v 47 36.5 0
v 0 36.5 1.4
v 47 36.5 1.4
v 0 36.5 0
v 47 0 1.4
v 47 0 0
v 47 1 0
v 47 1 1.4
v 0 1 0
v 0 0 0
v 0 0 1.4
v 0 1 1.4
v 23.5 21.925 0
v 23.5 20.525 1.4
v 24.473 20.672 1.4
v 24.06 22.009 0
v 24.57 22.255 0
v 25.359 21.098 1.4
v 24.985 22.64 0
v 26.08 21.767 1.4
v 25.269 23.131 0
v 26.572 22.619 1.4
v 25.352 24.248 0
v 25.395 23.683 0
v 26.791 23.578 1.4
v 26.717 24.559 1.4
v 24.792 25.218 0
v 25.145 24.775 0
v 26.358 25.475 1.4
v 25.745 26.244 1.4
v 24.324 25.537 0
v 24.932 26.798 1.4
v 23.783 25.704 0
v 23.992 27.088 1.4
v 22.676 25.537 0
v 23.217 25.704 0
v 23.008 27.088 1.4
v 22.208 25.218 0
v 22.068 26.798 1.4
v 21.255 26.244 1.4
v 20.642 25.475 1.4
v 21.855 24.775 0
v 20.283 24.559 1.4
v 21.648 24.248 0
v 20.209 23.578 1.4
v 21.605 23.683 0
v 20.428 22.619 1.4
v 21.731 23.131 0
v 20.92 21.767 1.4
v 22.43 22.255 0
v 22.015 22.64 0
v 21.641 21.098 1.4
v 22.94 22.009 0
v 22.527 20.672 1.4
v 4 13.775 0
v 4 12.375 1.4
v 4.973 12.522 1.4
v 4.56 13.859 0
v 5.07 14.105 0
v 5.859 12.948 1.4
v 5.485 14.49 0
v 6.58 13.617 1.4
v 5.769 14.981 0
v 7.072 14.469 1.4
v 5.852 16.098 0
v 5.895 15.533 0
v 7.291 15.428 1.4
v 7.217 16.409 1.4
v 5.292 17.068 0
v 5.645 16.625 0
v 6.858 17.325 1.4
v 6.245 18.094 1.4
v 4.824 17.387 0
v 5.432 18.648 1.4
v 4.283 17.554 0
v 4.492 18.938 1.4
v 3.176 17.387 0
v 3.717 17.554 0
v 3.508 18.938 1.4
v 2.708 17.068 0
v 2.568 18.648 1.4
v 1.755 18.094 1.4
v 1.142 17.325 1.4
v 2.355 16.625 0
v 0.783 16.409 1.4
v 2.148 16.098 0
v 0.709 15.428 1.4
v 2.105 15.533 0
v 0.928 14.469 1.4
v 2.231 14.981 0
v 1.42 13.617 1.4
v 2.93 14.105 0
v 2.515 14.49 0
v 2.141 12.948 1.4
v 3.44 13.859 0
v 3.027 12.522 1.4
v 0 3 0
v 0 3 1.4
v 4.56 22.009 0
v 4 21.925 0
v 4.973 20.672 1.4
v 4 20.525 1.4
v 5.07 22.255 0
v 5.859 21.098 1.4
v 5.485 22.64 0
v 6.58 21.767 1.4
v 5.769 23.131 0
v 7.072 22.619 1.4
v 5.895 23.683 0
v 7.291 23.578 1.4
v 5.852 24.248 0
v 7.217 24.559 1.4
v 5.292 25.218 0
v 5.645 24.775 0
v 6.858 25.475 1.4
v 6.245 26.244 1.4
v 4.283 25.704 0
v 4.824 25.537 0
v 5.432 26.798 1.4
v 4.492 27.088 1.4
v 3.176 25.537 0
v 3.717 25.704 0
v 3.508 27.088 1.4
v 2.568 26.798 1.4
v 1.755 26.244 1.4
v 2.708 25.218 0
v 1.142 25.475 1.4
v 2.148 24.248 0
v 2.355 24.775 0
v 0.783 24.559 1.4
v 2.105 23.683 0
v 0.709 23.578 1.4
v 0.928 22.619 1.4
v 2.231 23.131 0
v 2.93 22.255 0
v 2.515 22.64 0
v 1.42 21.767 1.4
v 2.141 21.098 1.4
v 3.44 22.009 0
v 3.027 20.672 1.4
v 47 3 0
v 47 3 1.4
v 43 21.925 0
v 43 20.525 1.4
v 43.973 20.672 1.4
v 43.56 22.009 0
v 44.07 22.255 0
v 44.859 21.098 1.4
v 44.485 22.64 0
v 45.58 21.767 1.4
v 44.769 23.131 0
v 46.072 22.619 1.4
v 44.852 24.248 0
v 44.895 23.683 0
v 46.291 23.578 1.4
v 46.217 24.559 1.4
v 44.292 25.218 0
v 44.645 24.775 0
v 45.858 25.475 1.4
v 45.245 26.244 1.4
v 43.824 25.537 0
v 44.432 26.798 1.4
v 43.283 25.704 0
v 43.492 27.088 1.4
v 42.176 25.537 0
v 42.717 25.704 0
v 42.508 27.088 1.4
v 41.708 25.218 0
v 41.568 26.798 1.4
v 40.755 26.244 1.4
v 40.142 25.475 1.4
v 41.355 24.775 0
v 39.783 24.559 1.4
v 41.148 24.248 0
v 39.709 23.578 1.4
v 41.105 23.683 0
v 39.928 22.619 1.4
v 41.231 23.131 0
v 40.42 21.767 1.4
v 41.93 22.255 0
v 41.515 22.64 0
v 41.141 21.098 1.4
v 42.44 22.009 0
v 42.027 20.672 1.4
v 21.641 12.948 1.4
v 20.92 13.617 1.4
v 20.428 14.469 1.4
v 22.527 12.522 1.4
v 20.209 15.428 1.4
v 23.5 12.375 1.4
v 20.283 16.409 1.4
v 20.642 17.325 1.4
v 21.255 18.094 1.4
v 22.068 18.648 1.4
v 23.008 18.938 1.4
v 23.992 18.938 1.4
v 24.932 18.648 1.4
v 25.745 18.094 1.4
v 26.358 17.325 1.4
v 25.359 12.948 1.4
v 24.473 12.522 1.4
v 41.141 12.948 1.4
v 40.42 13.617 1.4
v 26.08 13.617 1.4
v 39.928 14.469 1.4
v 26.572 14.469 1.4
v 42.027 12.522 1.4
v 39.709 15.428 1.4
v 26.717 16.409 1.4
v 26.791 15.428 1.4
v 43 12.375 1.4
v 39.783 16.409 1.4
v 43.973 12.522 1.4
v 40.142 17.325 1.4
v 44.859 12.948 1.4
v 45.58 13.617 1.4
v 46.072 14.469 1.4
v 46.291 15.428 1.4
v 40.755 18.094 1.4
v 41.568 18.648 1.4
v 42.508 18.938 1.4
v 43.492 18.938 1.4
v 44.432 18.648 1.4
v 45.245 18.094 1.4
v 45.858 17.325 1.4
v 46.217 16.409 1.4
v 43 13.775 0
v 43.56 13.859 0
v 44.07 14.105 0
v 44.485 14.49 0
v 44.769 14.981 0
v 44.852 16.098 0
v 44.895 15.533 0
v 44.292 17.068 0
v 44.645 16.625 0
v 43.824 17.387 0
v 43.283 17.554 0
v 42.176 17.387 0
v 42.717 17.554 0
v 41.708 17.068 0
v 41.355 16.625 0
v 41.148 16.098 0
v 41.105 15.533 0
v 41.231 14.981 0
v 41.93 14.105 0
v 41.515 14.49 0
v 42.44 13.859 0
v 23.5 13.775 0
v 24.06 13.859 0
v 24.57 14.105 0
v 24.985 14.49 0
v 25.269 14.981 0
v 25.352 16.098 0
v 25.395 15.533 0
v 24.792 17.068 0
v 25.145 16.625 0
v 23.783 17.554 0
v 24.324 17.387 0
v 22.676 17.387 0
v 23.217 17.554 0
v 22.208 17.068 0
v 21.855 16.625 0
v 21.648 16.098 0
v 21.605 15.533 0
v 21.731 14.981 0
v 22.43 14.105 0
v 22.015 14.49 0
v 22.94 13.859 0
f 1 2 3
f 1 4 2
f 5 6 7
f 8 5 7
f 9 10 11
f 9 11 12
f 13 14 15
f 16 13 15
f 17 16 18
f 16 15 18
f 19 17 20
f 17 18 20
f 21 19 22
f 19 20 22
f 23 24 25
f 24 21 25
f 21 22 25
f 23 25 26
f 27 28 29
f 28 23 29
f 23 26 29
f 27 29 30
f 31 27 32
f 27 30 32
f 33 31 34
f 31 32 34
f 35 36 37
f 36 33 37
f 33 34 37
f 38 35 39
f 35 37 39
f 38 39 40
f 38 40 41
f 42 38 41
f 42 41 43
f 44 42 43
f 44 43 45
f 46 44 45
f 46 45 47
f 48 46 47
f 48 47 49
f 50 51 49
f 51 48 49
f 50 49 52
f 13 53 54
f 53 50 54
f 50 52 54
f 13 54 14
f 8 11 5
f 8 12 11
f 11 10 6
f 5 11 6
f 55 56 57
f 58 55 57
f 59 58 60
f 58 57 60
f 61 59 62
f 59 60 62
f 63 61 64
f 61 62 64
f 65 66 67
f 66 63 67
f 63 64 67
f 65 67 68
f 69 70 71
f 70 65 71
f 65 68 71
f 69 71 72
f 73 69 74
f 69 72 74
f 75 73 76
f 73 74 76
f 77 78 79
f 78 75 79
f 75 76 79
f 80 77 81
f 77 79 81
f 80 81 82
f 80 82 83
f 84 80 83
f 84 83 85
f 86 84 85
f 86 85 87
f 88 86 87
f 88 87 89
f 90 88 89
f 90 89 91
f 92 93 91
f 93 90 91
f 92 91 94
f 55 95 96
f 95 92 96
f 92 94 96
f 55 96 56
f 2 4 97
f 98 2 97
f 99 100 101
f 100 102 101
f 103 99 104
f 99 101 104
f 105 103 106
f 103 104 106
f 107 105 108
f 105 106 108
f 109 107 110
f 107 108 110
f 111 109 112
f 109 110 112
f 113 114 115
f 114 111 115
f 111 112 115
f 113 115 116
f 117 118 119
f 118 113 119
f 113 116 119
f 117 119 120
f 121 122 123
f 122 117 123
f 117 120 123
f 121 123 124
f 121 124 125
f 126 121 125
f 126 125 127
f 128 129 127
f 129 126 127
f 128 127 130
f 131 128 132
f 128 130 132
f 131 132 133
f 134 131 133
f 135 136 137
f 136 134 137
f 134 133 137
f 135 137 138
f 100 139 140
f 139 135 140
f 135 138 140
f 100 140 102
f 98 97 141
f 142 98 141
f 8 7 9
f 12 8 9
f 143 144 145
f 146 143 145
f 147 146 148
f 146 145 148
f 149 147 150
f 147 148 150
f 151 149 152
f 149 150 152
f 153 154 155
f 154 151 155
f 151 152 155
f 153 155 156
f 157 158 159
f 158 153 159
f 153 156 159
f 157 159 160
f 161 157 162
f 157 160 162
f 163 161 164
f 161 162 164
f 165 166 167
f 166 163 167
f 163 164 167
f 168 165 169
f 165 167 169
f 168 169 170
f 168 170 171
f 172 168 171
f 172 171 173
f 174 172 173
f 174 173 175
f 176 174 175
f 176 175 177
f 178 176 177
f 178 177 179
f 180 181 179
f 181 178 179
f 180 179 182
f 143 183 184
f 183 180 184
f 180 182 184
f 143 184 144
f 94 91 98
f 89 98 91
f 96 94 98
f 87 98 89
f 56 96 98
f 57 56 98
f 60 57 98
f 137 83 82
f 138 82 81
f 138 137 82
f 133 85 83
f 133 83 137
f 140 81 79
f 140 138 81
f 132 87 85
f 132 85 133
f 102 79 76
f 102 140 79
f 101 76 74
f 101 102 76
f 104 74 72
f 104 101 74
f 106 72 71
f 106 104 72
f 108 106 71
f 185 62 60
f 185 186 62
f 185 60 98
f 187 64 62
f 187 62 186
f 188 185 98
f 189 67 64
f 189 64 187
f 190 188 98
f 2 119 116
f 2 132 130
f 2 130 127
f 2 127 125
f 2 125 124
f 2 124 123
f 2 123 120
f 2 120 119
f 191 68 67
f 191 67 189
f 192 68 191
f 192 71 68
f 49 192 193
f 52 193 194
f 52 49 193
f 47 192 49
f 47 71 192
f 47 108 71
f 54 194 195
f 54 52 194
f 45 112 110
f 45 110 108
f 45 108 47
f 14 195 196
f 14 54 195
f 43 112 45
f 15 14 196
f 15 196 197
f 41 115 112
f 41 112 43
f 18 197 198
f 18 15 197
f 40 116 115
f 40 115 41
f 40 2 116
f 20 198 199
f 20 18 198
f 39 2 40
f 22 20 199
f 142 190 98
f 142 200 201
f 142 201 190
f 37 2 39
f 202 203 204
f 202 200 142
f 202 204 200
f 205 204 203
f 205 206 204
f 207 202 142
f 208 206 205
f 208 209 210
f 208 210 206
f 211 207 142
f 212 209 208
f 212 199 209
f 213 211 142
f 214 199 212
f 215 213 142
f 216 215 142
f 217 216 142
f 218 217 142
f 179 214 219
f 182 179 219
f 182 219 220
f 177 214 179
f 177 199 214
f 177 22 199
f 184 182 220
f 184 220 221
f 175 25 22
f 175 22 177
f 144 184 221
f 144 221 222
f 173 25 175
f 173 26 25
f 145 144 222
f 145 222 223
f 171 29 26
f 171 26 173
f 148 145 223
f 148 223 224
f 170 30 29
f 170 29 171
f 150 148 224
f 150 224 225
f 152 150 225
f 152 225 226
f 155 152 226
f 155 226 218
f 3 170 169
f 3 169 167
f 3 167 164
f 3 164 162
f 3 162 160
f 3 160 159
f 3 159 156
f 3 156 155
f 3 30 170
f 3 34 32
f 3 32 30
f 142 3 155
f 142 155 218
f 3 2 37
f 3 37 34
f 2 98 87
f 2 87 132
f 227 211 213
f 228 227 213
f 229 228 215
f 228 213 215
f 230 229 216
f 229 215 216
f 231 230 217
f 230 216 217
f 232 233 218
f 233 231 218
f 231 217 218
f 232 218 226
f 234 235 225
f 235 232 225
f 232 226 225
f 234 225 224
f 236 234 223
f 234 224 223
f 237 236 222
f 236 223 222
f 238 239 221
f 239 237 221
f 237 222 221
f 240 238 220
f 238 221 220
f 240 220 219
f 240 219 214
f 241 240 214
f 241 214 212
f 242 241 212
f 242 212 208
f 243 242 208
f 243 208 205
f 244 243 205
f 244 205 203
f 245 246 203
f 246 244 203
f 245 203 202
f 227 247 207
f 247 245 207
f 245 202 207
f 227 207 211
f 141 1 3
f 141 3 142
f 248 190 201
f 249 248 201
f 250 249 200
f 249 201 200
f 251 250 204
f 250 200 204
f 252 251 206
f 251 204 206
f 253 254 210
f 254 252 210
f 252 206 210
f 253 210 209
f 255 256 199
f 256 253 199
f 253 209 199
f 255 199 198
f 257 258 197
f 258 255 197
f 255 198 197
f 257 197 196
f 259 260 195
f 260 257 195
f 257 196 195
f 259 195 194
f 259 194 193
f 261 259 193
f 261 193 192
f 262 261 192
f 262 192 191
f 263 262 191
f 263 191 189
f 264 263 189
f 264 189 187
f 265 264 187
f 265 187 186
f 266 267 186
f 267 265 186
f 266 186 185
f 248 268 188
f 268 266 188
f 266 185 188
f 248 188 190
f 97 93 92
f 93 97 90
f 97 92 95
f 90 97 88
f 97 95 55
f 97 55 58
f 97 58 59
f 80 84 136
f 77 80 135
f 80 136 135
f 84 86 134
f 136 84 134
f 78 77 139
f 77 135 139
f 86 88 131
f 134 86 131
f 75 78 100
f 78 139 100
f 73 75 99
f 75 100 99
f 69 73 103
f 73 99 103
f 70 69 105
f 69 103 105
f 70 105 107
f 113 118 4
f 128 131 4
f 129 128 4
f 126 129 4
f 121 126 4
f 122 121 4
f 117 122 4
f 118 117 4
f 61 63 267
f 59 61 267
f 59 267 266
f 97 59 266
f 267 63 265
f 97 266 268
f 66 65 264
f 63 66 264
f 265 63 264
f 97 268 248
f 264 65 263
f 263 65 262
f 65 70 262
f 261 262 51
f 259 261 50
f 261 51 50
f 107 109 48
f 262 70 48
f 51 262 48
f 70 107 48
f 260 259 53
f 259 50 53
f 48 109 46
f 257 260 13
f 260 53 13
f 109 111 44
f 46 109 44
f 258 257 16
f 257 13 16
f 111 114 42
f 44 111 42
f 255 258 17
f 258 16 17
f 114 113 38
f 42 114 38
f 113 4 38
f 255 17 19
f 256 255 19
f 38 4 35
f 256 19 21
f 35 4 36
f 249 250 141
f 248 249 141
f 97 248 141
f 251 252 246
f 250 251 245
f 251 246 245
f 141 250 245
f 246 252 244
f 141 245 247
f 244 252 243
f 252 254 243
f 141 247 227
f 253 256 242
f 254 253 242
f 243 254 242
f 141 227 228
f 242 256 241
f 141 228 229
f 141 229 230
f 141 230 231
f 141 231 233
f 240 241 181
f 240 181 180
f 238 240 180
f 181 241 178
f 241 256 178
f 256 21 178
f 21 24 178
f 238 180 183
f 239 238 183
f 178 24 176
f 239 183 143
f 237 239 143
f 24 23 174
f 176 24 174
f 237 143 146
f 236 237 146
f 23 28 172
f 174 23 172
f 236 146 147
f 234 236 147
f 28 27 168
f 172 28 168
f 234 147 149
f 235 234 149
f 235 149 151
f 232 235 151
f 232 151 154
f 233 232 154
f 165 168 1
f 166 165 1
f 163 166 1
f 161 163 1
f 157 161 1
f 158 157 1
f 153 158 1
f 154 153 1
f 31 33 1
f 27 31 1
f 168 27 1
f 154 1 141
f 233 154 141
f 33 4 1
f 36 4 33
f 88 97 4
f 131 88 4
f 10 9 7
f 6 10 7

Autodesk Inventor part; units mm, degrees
ref_plane "YZ Plane" through (0, 0, 0) normal (1, 0, 0) x (0, 1, 0)
ref_plane "XZ Plane" through (0, 0, 0) normal (0, 1, 0) x (-1, 0, 0)
ref_plane "XY Plane" through (0, 0, 0) normal (0, 0, 1) x (1, 0, 0)
ref_plane "Work Plane1" through (0, 0, 0) normal (0, 0, 1) x (1, 0, 0)
sketch "Sketch1" plane through (0, 0, 0) normal (0, 0, 1) x (1, 0, 0)
  line L0 (47, 0) -> (47, 3) projected
  line L1 (0, 3) -> (47, 3) projected
  line L2 (0, 0) -> (0, 3) projected
  line L3 (-65.5, 38.5) -> (112.5, 38.5)
  line L4 (112.5, 38.5) -> (112.5, -8.5)
  line L5 (112.5, -8.5) -> (-65.5, -8.5)
  line L6 (-65.5, -8.5) -> (-65.5, 38.5)
  line L7 (-65, -11.5) -> (-65, 38.5) projected
  line L8 (46, 36.5) -> (46, 3) projected
  line L9 (46, 3) -> (47, 3) projected
  line L10 (47, 36.5) -> (47, 3) projected
  line L11 (46, 36.5) -> (47, 36.5) projected
  line L12 (1, 36.5) -> (1, 3) projected
  line L13 (1, 36.5) -> (0, 36.5) projected
  line L14 (0, 36.5) -> (0, 3) projected
  line L15 (1, 3) -> (0, 3) projected
  line L16 (0, 36.5) -> (47, 36.5)
  line L17 (47, 36.5) -> (47, 1)
  line L18 (47, 1) -> (0, 1)
  line L19 (0, 1) -> (0, 36.5)
  line L20 (0, 0) -> (47, 0) projected
  point P0 (23.5, 0)
  point P1 (-65, -8.5)
  point P2 (0, 3)
  point P3 (47, 1)
  point P4 (0, 1)
  dimension "d0" = 178
  dimension "d1" = 89
  dimension "d2" = 89
  dimension "d3" = 0
  dimension "d13" = 3
extrude "Extrusion1" add sketch "Sketch1" along normal blind 1.4 contours L20 L2 L18 L0 | L1 L8 L11 L10 | L1 L12 L16 L8 | L14 L13 L12 L1
sketch "Sketch2" plane through (0, 0, 1.4) normal (0, 0, 1) x (1, 0, 0)
  circle A0 centre (4, 23.825) radius 2.3 projected
  circle A1 centre (4, 15.675) radius 2.3 projected
  line L0 (7, 36.5) -> (1, 36.5) projected
  line L1 (1, 3) -> (1, 36.5) projected
  line L2 (1, 3) -> (7, 3) projected
  line L3 (7, 3) -> (7, 36.5) projected
  circle A2 centre (23.5, 23.825) radius 2.3 projected
  circle A3 centre (23.5, 15.675) radius 2.3 projected
  line L4 (28, 36.5) -> (19, 36.5) projected
  line L5 (19, 3) -> (19, 36.5) projected
  line L6 (19, 3) -> (28, 3) projected
  line L7 (28, 3) -> (28, 36.5) projected
  circle A4 centre (43, 23.825) radius 2.3 projected
  circle A5 centre (43, 15.675) radius 2.3 projected
  line L8 (46, 36.5) -> (40, 36.5) projected
  line L9 (40, 3) -> (40, 36.5) projected
  line L10 (40, 3) -> (46, 3) projected
  line L11 (46, 3) -> (46, 36.5) projected
  point P0 (0, 0)
hole "Hole1" at (4, 23.825, 1.4) at (4, 15.675, 1.4) at (23.5, 15.675, 1.4) at (23.5, 23.825, 1.4) at (43, 23.825, 1.4) at (43, 15.675, 1.4) direction (0, 0, -1) diameter 3.6 end through all countersink diameter 6.6 countersink angle 90 clearance for "Countersunk Flat Head Screw ISO 2009/7046" size "M3" standard "ISO"
equation "\"d1\" = d2"
properties part number "back" material "Nylon 6/6"
